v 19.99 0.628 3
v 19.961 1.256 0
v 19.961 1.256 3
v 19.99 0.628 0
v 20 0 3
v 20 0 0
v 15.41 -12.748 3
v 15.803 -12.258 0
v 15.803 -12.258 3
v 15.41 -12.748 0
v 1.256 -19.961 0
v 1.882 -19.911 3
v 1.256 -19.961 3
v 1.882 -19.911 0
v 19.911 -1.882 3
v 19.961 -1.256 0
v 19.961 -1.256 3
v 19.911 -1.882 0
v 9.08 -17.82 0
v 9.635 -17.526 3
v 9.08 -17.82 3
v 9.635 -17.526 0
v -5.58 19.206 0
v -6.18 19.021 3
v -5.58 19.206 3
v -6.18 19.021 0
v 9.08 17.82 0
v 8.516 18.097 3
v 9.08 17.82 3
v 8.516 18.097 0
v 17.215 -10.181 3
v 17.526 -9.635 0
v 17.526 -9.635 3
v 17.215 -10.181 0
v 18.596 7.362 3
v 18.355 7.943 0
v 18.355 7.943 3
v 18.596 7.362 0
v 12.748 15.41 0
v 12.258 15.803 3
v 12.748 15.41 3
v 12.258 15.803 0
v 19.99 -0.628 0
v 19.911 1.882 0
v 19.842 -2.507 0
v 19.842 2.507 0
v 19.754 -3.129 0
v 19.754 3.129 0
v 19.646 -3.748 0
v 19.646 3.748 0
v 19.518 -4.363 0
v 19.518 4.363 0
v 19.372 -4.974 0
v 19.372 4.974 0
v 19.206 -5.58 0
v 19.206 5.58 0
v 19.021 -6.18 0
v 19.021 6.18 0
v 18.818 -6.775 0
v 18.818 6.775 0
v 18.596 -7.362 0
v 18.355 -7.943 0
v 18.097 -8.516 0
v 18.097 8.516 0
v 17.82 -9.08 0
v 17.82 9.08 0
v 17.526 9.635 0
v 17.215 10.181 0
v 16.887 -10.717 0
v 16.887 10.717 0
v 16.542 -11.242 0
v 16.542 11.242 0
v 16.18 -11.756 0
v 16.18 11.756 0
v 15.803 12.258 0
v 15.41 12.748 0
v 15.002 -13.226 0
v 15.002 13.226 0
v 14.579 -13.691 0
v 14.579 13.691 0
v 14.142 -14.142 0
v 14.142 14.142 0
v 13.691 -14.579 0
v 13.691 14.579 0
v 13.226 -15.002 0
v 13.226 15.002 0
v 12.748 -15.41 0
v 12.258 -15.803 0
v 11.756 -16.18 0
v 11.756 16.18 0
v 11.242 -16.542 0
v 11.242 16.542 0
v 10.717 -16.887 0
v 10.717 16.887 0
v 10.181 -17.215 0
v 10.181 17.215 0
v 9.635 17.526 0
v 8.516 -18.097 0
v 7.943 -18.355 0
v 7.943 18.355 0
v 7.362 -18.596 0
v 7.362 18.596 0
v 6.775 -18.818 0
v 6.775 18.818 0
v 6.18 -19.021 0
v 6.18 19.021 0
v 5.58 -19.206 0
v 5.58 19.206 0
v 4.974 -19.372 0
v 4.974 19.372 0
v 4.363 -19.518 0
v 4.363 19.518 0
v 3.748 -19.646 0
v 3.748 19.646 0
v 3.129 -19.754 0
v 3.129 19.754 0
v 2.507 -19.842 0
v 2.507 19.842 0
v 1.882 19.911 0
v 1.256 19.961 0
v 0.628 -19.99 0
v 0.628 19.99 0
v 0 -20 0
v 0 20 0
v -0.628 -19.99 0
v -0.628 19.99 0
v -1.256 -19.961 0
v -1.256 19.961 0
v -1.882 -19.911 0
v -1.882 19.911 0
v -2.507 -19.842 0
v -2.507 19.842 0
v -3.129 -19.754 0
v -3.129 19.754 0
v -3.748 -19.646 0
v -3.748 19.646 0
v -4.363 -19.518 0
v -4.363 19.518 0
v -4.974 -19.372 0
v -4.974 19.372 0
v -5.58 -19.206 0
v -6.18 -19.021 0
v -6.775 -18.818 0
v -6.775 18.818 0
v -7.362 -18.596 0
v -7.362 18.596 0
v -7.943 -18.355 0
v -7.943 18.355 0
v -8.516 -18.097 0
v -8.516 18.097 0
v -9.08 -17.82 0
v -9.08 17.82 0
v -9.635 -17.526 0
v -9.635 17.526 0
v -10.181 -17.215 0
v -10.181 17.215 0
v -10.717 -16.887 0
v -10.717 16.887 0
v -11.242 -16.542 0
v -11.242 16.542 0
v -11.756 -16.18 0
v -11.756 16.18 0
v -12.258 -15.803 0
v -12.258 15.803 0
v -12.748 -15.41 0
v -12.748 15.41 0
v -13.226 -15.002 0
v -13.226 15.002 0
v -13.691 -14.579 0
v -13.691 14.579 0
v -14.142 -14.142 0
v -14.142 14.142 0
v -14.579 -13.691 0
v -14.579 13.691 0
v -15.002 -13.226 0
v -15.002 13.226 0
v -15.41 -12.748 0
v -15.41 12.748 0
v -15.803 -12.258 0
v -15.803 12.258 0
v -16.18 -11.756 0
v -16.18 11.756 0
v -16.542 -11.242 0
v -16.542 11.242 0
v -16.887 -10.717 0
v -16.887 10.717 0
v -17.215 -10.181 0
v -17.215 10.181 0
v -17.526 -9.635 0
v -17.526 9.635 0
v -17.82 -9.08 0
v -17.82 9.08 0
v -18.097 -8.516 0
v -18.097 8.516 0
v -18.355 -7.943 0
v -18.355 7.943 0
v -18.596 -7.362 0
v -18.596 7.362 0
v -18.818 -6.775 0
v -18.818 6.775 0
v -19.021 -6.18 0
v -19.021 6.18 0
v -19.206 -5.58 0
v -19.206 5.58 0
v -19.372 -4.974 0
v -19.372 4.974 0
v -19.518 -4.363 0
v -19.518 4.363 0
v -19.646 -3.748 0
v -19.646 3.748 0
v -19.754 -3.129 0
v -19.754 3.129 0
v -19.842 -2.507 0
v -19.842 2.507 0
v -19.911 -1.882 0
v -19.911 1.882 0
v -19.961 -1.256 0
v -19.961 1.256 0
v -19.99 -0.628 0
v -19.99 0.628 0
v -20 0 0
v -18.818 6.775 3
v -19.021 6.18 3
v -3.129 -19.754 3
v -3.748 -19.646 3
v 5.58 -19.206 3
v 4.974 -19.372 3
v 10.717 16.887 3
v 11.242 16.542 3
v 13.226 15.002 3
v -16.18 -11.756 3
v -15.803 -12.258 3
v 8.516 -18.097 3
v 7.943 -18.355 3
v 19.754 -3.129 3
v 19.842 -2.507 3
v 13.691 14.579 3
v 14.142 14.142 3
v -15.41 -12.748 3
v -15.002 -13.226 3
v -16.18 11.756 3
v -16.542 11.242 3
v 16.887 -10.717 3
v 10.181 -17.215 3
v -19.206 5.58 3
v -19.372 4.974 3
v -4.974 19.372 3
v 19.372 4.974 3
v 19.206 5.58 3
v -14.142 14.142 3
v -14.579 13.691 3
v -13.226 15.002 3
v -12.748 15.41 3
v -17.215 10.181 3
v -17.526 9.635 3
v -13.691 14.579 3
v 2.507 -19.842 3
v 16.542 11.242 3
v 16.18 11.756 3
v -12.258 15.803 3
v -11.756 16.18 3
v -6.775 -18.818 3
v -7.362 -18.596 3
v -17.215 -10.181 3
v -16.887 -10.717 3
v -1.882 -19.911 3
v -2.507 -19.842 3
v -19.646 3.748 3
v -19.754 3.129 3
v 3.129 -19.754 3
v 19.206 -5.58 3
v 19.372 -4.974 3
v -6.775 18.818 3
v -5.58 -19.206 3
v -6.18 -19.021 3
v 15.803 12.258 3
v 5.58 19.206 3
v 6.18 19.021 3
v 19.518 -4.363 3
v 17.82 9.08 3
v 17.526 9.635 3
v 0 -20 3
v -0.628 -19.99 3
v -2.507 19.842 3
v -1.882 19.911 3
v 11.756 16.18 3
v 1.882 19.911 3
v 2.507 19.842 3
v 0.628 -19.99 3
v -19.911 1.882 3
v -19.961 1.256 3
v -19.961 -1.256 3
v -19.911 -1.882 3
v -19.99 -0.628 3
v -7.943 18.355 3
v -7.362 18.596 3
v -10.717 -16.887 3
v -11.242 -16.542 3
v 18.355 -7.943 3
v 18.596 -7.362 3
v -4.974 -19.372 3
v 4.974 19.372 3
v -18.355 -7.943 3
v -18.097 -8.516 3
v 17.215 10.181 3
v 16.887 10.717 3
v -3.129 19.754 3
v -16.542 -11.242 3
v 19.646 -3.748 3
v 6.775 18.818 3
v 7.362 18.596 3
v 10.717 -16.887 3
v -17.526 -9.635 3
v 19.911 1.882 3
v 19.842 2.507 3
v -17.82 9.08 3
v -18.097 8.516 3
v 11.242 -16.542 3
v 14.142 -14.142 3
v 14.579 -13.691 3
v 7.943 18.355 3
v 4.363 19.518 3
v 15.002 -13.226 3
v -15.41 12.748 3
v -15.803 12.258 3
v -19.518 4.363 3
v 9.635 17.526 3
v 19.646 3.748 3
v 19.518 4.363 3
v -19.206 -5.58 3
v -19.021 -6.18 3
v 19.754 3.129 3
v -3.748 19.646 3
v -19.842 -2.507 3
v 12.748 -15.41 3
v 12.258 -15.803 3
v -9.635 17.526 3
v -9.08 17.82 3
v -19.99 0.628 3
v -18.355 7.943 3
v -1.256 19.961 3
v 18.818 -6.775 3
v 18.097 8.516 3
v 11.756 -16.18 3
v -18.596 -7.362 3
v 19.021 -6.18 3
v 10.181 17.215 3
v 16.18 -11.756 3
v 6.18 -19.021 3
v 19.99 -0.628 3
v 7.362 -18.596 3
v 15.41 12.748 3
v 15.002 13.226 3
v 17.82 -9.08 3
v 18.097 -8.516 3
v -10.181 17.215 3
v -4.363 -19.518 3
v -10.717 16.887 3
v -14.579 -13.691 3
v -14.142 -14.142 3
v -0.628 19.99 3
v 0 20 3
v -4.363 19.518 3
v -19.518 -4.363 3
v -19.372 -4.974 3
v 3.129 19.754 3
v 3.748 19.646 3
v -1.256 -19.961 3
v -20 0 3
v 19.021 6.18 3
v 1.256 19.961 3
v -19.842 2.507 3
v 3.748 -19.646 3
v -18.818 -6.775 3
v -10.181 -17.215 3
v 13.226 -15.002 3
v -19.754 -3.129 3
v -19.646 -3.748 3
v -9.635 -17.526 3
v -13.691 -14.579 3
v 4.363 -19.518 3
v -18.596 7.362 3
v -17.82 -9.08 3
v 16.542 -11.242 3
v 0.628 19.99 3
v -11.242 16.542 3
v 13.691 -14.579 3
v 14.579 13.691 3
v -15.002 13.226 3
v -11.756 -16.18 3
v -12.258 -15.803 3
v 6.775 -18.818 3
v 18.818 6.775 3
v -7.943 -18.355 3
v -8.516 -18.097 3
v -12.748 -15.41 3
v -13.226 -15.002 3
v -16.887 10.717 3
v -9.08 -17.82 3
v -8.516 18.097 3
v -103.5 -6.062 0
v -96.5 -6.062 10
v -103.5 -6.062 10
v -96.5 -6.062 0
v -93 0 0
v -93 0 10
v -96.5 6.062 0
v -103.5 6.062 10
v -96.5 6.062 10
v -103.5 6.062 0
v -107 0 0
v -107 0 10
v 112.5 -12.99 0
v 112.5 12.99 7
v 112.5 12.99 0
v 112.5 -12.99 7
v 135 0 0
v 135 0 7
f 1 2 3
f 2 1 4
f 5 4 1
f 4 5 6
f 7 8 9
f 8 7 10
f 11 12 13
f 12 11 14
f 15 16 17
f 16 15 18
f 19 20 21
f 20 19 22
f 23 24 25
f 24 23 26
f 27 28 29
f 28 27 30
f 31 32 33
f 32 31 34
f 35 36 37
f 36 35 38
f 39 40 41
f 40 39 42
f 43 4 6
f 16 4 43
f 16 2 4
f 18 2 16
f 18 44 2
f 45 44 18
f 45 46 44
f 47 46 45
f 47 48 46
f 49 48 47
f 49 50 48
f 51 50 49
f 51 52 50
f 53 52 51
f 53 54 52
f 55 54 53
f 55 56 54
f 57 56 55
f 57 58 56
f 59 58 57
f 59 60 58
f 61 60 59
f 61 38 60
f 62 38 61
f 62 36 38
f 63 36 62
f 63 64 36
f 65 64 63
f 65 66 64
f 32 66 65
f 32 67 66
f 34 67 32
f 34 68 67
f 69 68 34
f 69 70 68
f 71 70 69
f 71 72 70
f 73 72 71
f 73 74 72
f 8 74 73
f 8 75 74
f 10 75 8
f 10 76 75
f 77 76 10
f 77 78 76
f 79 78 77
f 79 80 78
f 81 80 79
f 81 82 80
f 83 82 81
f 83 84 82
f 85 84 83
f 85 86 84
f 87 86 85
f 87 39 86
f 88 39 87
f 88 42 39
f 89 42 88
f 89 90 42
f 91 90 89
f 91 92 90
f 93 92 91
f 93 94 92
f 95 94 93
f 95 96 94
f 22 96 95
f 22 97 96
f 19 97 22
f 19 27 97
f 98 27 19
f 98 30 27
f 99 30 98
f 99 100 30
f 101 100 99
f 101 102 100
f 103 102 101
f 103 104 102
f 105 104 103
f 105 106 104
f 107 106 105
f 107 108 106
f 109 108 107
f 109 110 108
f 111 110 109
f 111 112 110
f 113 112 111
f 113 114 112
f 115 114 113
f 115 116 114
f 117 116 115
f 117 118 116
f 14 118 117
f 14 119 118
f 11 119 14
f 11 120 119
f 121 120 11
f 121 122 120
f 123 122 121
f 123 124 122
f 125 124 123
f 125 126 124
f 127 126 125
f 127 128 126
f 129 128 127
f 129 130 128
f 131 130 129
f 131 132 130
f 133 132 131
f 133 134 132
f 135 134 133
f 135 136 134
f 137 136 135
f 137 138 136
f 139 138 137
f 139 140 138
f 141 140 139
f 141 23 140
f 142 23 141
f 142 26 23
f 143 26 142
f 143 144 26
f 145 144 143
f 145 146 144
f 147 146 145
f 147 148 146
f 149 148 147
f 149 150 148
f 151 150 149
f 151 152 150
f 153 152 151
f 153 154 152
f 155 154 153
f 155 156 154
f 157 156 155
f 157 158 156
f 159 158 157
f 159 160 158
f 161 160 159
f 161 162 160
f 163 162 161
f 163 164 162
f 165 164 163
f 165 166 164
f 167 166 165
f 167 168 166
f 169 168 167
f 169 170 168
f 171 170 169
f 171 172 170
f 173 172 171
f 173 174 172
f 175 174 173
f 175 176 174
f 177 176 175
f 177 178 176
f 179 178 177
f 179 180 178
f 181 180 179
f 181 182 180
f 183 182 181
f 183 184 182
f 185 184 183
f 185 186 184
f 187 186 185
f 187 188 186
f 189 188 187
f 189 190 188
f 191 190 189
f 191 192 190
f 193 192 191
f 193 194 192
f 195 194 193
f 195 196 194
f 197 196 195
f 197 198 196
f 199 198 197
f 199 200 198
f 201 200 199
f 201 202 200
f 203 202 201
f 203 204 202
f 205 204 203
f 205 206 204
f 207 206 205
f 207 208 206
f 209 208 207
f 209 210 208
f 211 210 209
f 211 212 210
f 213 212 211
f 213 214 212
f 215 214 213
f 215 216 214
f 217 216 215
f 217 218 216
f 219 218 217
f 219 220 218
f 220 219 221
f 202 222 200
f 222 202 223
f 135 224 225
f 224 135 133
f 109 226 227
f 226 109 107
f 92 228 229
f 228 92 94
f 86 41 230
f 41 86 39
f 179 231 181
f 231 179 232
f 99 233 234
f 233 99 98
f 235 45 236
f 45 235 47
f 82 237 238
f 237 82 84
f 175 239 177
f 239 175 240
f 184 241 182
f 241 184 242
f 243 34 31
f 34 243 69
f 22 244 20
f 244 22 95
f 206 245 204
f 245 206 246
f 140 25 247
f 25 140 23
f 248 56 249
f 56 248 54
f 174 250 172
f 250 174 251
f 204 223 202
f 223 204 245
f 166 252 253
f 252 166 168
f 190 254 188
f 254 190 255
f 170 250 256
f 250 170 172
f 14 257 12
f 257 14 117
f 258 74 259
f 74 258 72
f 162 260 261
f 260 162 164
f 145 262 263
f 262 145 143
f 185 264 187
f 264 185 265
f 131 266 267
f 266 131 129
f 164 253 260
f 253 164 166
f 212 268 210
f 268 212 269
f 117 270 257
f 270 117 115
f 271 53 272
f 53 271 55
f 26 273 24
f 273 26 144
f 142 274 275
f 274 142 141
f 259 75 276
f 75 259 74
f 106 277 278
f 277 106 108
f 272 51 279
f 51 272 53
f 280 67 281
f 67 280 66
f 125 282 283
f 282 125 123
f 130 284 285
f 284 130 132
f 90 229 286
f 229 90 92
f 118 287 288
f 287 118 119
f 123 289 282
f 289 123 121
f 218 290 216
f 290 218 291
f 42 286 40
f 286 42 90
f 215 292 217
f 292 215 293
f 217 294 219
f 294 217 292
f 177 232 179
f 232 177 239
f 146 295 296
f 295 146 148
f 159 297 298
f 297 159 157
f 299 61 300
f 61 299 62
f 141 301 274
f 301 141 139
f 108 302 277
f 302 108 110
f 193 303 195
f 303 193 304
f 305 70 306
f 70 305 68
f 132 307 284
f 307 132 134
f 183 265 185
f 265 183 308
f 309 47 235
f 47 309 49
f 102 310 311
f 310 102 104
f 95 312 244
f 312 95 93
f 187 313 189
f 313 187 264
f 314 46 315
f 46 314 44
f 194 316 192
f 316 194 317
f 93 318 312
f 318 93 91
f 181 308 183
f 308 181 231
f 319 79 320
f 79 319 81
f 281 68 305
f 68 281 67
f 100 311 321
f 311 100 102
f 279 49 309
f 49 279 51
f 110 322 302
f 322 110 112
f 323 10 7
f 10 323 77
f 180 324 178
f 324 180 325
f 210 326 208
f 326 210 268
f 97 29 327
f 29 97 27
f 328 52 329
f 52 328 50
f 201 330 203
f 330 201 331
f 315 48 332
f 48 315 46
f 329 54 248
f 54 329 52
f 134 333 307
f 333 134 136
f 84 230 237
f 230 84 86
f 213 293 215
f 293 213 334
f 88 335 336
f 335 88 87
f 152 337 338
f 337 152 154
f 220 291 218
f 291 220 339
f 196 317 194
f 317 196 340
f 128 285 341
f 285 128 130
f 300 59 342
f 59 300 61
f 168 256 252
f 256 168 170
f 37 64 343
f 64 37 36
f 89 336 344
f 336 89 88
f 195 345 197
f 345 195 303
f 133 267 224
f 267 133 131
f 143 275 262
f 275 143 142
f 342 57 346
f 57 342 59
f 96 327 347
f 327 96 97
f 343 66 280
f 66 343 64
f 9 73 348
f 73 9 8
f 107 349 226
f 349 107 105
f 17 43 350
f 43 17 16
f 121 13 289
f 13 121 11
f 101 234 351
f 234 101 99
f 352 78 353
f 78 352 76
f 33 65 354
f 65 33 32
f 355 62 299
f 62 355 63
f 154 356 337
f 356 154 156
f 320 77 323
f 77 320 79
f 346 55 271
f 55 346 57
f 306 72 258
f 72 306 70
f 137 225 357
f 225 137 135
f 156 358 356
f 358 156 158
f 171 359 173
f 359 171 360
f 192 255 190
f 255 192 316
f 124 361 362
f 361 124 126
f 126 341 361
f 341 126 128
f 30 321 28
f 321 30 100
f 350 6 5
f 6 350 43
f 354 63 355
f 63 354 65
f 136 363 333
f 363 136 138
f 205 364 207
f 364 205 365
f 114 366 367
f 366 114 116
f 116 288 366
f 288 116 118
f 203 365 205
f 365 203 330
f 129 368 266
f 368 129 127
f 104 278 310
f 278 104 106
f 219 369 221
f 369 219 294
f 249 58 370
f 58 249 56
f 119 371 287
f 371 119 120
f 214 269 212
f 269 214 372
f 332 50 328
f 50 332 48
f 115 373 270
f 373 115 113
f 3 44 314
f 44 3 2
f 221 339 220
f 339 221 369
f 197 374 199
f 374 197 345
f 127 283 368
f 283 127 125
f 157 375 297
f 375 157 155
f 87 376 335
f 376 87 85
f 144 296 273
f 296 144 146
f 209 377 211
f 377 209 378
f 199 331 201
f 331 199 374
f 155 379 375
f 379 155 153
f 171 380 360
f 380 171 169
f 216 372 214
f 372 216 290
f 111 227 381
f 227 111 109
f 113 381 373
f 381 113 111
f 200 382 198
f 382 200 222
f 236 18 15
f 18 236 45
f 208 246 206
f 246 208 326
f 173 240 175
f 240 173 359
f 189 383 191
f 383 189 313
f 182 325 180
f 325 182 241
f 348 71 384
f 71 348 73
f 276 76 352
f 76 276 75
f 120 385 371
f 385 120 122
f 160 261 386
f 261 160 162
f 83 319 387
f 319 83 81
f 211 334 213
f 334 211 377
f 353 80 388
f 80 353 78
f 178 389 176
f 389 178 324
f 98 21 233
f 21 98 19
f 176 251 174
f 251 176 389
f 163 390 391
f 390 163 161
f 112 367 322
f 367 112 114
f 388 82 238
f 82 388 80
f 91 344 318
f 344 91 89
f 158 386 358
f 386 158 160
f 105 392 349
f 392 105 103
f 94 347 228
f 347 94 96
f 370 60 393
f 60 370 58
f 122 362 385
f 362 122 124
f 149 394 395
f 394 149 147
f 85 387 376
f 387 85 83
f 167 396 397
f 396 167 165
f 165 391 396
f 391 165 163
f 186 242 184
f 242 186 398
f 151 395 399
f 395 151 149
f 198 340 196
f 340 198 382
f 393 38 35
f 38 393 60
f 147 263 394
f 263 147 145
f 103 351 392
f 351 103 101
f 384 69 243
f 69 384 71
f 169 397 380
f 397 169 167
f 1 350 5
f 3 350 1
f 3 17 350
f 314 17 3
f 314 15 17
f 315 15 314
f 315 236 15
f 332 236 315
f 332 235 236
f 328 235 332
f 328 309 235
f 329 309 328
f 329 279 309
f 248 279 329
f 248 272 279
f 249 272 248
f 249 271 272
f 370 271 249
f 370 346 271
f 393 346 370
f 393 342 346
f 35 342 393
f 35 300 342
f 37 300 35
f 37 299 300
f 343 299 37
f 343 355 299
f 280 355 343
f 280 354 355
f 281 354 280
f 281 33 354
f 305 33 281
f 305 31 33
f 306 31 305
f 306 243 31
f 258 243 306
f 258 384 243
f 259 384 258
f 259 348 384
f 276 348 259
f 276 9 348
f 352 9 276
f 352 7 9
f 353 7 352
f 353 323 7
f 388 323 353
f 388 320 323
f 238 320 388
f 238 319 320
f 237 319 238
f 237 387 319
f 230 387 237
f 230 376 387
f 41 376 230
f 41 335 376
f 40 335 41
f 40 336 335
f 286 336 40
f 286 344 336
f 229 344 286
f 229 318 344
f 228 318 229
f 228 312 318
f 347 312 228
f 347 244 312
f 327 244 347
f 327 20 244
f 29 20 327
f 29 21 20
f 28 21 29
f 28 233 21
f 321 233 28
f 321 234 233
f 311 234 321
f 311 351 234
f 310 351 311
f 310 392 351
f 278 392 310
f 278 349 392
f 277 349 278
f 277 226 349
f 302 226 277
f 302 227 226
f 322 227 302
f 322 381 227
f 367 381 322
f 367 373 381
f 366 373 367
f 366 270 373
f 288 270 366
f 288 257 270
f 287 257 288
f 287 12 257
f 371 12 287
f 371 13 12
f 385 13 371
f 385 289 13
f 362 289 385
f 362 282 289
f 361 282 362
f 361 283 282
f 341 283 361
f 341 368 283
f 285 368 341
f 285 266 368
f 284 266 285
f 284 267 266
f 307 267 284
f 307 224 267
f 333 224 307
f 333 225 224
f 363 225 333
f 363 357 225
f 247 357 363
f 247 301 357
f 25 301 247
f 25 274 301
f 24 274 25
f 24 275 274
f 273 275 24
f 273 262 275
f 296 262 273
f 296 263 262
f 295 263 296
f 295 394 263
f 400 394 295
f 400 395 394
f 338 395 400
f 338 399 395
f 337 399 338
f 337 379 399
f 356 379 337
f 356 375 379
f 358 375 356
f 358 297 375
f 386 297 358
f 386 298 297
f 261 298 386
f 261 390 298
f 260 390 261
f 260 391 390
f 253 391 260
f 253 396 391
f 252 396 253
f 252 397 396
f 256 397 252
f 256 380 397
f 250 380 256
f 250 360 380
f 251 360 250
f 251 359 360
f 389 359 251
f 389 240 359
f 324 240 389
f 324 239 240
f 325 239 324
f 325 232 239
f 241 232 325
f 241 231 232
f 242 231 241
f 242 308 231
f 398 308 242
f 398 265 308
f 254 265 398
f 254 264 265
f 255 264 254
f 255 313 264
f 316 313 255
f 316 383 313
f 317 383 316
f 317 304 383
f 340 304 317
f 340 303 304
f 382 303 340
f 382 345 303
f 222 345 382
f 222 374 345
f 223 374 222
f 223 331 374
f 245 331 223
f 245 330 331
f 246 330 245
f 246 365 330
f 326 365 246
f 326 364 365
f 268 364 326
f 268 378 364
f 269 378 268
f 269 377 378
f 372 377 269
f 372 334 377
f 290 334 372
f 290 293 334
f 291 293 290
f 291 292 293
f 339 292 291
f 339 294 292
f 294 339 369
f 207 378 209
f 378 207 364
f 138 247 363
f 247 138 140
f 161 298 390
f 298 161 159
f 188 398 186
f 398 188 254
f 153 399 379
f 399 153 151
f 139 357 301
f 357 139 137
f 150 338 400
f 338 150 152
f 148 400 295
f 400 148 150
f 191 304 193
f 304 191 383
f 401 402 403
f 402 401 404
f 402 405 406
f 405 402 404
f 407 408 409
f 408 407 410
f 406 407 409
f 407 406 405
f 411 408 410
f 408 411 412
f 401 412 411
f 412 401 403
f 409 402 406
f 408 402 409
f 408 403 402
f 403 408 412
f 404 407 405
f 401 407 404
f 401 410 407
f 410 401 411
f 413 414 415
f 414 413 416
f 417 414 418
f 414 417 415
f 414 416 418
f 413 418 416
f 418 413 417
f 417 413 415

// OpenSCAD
// Moneda en el centro

color("red")
    cylinder(h=3,r=20,$fn=200);
    
// hexágono en los negativos

color("blue")
    translate([-100,0,0])
        cylinder(h=10,r=7,$fn=6);
        
        
        
// triangulo en los positivo

color("green")
    translate([120,0,0])
        cylinder(h=7,r=15,$fn=3);
